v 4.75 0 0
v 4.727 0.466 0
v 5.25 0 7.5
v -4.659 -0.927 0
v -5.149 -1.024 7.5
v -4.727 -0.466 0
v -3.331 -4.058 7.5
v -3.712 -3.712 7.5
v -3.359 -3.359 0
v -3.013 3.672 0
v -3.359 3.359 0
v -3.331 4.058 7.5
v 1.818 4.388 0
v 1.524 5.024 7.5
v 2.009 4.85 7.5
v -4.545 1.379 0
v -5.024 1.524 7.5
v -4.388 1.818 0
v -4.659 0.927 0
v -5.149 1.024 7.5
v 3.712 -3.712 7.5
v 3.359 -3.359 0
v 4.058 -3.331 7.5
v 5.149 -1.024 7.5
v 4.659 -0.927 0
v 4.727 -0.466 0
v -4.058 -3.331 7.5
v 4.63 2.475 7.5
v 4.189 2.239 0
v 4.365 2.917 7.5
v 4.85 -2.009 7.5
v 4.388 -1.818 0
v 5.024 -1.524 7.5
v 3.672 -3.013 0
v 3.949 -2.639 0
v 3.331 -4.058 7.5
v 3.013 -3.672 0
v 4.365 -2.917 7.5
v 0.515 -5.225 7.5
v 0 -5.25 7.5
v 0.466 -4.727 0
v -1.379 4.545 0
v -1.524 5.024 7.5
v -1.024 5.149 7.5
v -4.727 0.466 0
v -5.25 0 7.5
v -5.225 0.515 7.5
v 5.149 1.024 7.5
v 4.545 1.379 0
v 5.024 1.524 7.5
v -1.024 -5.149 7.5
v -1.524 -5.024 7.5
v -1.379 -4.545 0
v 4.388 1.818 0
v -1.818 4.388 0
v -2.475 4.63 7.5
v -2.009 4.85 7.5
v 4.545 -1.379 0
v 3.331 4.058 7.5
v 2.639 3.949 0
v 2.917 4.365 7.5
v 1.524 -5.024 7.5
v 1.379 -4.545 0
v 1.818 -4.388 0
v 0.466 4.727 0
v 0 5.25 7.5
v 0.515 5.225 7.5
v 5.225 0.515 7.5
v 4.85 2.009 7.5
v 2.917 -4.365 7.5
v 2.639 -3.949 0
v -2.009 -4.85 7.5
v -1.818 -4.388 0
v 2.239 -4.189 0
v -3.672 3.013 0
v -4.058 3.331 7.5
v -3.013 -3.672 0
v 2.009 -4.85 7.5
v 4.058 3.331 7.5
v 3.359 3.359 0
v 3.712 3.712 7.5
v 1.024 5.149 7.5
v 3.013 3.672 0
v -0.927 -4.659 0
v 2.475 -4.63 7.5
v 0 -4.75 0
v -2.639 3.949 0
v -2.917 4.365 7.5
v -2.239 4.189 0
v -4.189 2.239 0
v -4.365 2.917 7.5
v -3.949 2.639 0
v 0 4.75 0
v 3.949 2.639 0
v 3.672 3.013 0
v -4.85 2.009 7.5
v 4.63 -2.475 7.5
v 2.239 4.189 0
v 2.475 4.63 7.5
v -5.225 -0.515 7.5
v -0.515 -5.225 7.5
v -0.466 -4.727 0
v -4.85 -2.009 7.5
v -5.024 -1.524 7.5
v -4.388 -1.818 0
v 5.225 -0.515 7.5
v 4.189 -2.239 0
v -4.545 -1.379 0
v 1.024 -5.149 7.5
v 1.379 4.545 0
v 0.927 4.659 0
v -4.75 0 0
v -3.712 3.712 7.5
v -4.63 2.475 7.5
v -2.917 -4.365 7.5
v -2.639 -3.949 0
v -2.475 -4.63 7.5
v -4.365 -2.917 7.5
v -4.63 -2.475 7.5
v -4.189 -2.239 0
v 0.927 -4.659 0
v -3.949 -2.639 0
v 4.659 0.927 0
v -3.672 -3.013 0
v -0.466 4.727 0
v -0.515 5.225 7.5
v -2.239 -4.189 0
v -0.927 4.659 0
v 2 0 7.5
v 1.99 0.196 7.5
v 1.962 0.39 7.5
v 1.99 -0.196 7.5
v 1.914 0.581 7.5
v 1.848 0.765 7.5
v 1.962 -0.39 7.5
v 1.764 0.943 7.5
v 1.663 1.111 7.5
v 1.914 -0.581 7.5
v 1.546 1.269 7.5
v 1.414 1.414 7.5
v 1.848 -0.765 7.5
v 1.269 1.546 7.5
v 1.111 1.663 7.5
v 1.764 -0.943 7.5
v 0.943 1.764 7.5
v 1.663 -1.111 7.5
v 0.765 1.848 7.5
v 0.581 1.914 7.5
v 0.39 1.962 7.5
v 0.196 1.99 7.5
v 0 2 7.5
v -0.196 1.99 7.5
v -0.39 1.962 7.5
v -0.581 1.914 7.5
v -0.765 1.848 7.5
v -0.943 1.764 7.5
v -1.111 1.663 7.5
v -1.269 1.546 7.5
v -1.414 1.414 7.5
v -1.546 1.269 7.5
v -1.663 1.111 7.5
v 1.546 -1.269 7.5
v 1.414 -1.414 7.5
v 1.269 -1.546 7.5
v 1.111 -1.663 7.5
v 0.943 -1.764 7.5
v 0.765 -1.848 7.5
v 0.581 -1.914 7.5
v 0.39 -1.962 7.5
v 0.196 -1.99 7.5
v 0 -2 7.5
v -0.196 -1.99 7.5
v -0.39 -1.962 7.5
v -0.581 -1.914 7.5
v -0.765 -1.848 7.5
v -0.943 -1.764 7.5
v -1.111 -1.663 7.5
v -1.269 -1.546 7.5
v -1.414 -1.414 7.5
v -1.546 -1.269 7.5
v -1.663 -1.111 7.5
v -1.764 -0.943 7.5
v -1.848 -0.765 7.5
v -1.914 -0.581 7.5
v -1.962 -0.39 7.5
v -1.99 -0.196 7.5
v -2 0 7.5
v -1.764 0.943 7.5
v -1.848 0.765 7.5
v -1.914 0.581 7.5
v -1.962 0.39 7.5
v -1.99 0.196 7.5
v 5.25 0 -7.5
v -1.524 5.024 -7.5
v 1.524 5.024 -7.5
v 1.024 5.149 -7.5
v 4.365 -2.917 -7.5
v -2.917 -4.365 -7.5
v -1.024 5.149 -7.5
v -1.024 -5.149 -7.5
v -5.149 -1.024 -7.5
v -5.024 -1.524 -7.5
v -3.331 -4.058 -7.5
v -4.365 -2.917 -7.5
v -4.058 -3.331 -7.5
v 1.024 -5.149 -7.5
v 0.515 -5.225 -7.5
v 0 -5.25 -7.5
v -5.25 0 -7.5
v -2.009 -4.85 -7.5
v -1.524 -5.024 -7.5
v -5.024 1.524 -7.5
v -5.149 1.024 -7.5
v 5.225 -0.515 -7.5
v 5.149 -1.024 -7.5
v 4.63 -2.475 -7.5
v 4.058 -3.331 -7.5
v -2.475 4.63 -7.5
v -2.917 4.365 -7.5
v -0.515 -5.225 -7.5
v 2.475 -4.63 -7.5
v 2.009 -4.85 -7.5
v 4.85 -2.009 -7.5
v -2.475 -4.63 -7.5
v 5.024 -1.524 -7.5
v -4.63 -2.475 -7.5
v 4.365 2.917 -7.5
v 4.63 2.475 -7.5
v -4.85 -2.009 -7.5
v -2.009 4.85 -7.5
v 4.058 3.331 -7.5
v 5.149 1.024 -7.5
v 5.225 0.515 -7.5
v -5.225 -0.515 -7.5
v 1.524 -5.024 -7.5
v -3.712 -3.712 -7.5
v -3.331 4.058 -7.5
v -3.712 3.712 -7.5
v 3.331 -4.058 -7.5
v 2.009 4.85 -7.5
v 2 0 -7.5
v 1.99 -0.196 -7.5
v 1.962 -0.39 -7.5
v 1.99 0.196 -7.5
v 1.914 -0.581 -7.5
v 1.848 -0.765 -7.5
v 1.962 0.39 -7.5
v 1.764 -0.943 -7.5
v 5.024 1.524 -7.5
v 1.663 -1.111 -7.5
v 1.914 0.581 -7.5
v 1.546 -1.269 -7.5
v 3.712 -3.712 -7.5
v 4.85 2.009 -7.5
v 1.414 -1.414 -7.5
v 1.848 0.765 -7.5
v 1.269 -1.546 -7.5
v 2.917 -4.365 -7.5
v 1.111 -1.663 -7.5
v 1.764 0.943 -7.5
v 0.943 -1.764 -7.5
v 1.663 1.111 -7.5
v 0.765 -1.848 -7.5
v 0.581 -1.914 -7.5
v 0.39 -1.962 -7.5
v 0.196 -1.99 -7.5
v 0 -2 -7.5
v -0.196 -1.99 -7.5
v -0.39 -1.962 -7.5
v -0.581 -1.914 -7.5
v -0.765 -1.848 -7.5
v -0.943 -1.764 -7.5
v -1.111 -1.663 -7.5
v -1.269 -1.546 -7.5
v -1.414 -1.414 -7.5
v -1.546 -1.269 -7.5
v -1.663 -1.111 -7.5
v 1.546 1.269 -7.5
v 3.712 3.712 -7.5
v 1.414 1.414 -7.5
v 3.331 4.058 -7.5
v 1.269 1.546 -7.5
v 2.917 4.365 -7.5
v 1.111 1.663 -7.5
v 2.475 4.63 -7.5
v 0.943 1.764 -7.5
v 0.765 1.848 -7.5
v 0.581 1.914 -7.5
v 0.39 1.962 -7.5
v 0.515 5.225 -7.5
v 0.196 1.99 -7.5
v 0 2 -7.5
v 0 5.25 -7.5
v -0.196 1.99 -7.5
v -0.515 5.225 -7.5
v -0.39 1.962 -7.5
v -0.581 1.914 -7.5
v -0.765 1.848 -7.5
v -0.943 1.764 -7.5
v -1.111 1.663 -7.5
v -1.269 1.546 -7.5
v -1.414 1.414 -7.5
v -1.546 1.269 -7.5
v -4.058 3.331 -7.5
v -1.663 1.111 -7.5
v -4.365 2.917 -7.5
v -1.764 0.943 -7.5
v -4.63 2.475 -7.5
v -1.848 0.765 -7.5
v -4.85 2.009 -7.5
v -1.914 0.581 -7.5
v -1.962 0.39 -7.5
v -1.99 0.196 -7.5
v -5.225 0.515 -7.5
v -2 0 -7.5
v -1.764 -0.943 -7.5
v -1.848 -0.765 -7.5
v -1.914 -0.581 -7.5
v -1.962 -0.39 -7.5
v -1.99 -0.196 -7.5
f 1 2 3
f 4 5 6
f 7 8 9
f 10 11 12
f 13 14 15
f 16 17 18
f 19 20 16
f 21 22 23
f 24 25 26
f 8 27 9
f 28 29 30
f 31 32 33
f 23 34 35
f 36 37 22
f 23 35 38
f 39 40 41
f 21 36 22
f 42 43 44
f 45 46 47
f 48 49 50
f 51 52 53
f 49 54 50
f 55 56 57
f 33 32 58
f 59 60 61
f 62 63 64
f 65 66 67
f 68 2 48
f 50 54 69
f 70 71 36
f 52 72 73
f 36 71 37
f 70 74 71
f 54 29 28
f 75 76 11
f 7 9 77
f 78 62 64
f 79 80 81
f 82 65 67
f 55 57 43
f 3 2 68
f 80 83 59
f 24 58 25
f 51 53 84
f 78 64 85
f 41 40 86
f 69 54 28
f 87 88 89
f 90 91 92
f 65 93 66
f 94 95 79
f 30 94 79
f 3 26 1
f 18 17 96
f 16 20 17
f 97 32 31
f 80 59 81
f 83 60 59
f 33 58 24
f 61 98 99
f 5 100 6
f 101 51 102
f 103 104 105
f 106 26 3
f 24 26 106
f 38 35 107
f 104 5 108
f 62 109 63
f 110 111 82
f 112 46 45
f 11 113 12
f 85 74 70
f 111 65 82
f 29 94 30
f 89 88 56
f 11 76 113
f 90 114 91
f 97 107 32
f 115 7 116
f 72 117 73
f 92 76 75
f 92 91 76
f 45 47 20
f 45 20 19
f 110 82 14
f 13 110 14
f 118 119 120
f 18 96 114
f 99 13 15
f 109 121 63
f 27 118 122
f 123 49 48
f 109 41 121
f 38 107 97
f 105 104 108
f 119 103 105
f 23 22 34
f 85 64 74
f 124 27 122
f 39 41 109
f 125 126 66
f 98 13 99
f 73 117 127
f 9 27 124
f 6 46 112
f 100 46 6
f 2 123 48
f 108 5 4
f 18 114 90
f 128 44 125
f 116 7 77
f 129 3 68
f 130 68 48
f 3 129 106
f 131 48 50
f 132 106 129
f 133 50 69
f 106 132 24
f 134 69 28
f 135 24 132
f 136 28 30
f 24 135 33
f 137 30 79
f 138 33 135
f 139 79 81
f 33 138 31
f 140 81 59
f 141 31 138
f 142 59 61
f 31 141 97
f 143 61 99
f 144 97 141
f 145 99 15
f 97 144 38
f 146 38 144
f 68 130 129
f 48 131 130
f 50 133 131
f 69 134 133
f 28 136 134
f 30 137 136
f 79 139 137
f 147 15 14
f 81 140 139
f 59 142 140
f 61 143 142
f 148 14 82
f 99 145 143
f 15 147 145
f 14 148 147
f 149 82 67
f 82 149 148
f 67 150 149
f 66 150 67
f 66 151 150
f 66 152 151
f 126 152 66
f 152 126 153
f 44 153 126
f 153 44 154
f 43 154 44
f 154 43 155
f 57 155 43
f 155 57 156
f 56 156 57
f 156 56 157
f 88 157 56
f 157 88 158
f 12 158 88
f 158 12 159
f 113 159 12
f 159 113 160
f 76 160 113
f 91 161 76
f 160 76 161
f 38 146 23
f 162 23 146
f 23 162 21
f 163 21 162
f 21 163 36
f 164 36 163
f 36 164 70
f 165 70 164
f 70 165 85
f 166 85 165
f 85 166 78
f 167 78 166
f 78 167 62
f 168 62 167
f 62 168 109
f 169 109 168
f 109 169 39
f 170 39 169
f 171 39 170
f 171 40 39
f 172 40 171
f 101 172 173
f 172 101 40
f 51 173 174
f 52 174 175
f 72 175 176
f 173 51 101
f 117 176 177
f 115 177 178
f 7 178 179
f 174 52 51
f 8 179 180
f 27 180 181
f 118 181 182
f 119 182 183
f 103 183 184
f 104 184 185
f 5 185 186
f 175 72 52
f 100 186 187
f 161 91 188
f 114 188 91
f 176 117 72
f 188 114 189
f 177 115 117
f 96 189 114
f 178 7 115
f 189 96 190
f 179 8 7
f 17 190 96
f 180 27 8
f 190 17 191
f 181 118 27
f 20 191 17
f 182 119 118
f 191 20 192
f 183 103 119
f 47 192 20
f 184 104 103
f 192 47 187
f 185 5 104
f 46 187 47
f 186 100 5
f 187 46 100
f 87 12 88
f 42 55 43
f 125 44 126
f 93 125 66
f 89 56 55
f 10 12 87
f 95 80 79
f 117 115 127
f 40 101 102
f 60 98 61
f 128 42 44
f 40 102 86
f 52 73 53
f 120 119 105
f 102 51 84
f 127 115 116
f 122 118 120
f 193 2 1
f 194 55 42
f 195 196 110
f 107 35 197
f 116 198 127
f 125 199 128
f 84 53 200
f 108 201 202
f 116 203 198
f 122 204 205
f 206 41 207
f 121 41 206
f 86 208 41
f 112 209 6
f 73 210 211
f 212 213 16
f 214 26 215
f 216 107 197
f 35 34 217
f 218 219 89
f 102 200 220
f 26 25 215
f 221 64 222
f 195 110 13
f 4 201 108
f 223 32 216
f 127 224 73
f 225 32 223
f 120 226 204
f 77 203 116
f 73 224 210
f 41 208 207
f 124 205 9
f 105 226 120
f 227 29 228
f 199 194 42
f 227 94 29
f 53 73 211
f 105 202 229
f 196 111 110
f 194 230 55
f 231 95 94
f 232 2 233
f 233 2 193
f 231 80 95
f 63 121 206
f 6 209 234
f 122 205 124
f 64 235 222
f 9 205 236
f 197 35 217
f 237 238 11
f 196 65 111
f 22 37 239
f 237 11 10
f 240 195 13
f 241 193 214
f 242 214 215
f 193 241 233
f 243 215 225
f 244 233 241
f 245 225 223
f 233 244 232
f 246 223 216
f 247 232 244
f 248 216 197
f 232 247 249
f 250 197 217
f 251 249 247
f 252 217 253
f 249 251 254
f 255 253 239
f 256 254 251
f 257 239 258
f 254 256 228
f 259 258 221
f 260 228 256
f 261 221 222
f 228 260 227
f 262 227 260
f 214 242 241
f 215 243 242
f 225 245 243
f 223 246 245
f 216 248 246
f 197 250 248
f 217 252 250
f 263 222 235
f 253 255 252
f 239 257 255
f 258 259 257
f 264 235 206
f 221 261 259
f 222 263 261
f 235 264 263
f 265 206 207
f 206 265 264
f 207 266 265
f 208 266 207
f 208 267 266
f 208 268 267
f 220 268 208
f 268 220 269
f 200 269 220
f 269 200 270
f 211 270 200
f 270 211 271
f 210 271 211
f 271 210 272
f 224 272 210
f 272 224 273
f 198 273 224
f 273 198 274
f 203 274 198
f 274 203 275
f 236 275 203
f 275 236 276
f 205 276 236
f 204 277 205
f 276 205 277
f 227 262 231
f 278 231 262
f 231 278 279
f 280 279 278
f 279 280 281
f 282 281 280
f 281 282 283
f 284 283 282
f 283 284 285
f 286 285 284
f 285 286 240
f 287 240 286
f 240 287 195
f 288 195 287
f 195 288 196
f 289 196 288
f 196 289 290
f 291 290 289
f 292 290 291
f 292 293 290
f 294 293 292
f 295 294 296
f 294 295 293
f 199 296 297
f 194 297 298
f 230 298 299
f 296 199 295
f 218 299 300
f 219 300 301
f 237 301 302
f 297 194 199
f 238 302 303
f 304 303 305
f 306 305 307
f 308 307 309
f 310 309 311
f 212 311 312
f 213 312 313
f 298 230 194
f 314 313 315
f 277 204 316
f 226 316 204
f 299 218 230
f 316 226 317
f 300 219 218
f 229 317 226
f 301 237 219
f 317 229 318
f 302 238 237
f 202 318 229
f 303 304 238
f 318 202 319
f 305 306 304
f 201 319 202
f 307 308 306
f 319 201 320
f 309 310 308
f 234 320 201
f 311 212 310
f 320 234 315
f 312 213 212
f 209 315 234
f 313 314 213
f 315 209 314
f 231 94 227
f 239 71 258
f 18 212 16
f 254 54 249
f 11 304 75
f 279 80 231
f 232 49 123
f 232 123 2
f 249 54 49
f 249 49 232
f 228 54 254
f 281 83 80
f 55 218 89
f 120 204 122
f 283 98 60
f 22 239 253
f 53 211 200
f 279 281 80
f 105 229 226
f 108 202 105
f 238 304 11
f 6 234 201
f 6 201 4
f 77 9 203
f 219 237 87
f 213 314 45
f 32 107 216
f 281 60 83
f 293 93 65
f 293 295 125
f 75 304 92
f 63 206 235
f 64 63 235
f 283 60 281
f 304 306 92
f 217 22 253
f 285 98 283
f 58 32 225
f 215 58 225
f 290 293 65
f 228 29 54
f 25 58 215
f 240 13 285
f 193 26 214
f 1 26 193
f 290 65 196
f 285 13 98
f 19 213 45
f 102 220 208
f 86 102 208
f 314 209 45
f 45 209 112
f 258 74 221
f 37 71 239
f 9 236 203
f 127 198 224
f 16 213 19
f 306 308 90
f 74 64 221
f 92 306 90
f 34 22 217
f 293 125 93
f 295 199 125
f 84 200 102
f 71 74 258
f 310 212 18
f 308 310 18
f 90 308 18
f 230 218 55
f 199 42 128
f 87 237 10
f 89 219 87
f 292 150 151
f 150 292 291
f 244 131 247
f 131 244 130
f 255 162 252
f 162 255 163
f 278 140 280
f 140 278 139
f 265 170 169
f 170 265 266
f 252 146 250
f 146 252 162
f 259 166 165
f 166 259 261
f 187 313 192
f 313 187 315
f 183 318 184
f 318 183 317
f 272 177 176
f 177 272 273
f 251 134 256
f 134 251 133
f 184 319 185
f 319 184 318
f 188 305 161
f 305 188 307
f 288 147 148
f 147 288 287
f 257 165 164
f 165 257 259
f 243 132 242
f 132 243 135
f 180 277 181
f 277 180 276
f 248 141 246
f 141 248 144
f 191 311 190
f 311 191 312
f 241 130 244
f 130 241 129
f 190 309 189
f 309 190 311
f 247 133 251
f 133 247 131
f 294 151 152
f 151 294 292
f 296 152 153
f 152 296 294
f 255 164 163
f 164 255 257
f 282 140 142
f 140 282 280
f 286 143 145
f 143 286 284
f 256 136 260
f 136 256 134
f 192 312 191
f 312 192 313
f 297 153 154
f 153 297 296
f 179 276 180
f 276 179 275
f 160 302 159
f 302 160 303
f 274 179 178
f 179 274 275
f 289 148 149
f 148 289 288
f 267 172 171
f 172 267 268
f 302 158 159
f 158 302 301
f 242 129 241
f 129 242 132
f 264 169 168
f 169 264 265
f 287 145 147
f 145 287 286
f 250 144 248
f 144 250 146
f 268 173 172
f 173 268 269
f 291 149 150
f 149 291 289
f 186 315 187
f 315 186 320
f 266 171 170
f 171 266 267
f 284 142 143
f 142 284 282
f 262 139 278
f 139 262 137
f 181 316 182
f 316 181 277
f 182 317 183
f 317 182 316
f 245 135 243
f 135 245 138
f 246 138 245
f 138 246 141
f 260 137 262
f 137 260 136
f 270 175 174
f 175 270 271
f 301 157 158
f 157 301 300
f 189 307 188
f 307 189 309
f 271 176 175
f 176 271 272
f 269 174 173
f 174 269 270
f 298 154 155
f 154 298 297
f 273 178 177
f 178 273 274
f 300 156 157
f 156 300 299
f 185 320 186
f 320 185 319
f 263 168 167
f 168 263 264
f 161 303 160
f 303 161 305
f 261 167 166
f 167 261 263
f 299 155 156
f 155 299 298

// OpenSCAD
$fn=64;
od1=9.5;
od2=10.5;
id=4;
wid=15;
difference() {
  union() {
    cylinder(d1=od1,d2=od2,h=wid/2);
    mirror([0,0,1])cylinder(d1=od1,d2=od2,h=wid/2);
  }
  cylinder(d=id,h=wid,center=true);
}
